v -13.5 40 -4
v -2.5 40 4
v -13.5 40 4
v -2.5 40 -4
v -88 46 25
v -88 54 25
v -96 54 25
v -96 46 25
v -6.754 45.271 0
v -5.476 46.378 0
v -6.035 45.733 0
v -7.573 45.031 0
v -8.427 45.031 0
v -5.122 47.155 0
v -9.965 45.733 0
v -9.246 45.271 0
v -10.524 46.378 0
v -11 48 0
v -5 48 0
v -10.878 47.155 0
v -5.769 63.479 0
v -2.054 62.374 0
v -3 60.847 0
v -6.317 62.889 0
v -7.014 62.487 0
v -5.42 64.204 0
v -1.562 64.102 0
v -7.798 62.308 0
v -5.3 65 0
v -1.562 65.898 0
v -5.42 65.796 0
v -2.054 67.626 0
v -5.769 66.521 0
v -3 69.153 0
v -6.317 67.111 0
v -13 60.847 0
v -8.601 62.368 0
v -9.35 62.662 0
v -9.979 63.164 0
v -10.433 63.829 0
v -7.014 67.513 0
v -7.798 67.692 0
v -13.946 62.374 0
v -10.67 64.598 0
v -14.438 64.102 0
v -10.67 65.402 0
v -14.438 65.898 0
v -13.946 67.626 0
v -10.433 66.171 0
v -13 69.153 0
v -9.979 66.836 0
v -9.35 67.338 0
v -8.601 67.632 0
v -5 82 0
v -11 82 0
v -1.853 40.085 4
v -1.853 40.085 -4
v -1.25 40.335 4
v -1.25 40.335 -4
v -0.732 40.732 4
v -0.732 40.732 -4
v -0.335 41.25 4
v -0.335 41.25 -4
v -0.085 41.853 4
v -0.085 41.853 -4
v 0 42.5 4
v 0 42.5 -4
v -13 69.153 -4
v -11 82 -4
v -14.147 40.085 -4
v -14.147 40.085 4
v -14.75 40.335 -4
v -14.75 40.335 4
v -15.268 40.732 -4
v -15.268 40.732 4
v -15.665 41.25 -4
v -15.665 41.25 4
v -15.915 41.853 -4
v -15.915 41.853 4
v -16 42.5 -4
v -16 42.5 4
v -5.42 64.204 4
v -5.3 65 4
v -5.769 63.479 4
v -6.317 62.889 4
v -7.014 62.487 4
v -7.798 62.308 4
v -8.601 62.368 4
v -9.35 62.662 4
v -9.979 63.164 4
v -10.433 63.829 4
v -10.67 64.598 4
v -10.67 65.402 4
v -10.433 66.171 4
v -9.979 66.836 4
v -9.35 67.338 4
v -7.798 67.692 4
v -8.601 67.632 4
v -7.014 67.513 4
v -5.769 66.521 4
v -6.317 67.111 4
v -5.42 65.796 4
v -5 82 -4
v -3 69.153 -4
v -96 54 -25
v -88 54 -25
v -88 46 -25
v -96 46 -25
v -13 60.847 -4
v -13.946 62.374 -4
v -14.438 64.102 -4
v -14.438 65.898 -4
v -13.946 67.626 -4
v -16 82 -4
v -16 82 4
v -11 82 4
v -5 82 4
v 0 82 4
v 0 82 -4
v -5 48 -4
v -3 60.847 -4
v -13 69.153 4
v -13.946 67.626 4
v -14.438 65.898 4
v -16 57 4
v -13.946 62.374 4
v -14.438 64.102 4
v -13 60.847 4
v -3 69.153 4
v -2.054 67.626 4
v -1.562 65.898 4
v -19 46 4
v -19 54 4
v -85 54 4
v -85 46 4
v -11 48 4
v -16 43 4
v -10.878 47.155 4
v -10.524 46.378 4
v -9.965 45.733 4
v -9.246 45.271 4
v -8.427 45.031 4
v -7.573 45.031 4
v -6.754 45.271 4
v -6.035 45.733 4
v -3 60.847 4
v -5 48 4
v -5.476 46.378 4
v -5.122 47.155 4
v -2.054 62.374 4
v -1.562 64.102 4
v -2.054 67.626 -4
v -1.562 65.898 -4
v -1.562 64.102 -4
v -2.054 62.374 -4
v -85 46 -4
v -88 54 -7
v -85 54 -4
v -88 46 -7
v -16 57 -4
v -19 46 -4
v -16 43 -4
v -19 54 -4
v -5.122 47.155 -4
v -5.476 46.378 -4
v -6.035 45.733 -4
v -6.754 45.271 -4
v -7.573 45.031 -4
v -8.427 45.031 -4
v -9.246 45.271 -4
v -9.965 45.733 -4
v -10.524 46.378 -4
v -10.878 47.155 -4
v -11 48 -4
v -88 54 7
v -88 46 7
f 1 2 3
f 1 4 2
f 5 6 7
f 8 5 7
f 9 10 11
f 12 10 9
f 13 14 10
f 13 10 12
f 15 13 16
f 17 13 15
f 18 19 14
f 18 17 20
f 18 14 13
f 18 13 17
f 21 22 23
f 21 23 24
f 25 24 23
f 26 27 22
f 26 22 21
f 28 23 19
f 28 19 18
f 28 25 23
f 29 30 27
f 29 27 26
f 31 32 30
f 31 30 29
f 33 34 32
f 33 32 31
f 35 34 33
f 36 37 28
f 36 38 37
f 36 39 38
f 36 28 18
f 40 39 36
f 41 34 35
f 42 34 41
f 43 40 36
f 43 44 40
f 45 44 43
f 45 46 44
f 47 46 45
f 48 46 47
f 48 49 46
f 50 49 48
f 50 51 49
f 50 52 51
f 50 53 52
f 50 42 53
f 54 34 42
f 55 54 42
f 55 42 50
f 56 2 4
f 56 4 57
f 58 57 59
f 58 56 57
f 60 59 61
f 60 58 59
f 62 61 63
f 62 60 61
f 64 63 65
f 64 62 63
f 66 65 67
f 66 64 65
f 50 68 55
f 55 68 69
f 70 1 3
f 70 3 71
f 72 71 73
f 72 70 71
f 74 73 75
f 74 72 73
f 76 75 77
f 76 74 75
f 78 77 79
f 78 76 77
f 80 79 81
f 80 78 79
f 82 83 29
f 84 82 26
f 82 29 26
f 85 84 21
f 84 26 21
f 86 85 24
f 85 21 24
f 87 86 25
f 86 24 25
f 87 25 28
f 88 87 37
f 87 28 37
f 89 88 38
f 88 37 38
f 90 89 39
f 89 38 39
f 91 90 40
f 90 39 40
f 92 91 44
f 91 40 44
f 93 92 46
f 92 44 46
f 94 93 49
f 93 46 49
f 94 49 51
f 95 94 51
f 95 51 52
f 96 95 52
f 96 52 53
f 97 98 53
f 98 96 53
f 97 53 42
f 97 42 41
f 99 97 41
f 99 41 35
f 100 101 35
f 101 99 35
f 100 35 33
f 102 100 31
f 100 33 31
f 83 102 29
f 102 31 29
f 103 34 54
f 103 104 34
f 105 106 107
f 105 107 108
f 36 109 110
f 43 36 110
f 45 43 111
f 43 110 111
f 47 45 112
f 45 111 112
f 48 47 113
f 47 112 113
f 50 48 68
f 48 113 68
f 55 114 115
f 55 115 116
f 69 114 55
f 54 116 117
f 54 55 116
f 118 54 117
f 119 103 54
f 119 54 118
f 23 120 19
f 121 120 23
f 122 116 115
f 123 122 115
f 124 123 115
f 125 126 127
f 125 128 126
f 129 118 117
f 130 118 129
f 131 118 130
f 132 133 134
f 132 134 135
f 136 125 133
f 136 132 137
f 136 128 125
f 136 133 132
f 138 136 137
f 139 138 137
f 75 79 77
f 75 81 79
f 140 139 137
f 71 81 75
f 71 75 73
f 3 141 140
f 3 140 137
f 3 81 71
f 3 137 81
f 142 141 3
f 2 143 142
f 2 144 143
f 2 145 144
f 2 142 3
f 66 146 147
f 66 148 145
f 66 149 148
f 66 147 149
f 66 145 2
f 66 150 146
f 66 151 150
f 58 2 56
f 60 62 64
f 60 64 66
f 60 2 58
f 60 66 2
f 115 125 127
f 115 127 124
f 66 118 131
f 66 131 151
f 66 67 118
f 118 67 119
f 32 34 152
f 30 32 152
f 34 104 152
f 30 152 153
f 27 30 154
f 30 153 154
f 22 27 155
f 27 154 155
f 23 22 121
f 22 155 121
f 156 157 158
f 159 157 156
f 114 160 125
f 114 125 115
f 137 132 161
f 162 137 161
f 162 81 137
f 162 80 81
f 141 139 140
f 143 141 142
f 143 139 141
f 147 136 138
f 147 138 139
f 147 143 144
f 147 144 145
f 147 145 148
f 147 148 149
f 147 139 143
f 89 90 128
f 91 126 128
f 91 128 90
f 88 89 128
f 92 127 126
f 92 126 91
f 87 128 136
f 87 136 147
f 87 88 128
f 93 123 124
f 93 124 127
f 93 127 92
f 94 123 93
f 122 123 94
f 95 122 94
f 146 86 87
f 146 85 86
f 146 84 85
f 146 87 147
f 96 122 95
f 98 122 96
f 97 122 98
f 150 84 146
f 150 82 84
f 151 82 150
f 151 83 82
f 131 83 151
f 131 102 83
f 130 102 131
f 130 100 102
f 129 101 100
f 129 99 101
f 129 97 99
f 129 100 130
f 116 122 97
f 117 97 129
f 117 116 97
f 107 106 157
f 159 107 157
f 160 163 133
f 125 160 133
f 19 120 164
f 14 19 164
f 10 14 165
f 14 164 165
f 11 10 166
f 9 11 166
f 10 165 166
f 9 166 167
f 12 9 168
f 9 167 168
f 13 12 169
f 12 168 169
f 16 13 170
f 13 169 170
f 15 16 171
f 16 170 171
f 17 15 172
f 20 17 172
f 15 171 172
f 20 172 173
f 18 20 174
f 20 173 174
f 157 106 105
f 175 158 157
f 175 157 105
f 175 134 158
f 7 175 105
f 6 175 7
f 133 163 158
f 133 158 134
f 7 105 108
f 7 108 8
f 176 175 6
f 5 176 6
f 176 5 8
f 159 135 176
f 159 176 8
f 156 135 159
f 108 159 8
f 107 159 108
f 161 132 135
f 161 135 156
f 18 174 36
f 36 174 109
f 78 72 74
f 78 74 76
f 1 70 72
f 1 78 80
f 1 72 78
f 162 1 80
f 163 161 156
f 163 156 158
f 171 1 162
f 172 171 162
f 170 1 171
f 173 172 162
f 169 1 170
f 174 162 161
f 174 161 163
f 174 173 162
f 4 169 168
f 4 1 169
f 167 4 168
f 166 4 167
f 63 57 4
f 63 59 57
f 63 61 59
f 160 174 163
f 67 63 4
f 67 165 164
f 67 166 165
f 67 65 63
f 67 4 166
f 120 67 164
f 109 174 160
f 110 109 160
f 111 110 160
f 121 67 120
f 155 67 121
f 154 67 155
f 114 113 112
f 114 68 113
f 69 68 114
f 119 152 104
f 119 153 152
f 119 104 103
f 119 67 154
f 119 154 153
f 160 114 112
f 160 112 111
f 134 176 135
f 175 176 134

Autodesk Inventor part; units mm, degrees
ref_plane "YZ Plane" through (0, 0, 0) normal (1, 0, 0) x (0, 1, 0)
ref_plane "XZ Plane" through (0, 0, 0) normal (0, 1, 0) x (-1, 0, 0)
ref_plane "XY Plane" through (0, 0, 0) normal (0, 0, 1) x (1, 0, 0)
sketch "Skizze2" plane through (0, 0, 0) normal (0, 0, 1) x (1, 0, 0)
  line L0 (-19.9249, 0) -> (3.9249, 0) projected
  line L1 (0, -18.1036) -> (0, 108.6213) projected
  circle A0 centre (-8, 65) radius 2.7
  line L2 (0, 0) -> (0, 87.5)
  arc A1 (0, 87.5) -> (-2.5, 90) centre (-2.5, 87.5) ccw
  line L3 (-13.5, 90) -> (-2.5, 90)
  arc A2 (-13.5, 90) -> (-16, 87.5) centre (-13.5, 87.5) ccw
  line L4 (0, 42.5) -> (0, 87.5)
  line L5 (-16, 40) -> (-16, 87.5)
  line L6 (0, 40) -> (-16, 40)
  point P0 (-8, 90)
  dimension "d4" = 2.5
  dimension "d5" = 2.5
  dimension "d6" = 5.4
  dimension "d8" = 25
  dimension "d17" = 2.5
  dimension "d18" = 2.5
  dimension "d19" = 2.5
  dimension "d144" = 25
extrude "Extrusion1" add sketch "Skizze2" along normal mid plane 8
sketch "Skizze7" plane through (0, 0, -4) normal (0, 0, -1) x (-1, 0, 0)
  arc A0 (16, 87.5) -> (13.5, 90) centre (13.5, 87.5) ccw projected
  line L0 (13.5, 90) -> (2.5, 90) projected
  arc A1 (2.5, 90) -> (0, 87.5) centre (2.5, 87.5) ccw projected
  line L1 (0, 87.5) -> (0, 40) projected
  circle A2 centre (8, 65) radius 2.7 projected
  circle A3 centre (8, 65) radius 6.5
  line L2 (8, 85) -> (8, 45)
  line L3 (13, 82.2483) -> (13, 48.2483)
  line L4 (3, 48.3648) -> (3, 82.3648)
  line L5 (16, 40) -> (16, 87.5) projected
  line L6 (0, 40) -> (16, 40) projected
  circle A4 centre (8, 82) radius 3
  circle A5 centre (8, 48) radius 3
  line L7 (-2, 82) -> (18, 82)
  line L8 (-2, 48) -> (18, 48)
  line L9 (5, 48) -> (3, 60.8467)
  line L10 (11, 48) -> (13, 60.8467)
  line L11 (3, 69.1533) -> (5, 82)
  line L12 (13, 69.1533) -> (11, 82)
  point P0 (0, 0)
  point P1 (8, 65)
  dimension "d133" = 13
  dimension "d136" = 20
  dimension "d137" = 20
  dimension "d194" = 6
  dimension "d195" = 6
  dimension "d196" = 3
  dimension "d197" = 3
  dimension "d198" = 10
  dimension "d199" = 20
  dimension "d200" = 20
extrude "Extrusion5" cut sketch "Skizze7" against normal blind 4 contours L8 L2 A5 | A5 L2 L8 | A5 L2 A3 L10 | L3 A3 L2 A2 | A3 L3 | A3 L2 A4 L12 | L7 L2 A4 | A4 L2 L7 | A5 L8 L2 | A5 L9 A3 L2 | L2 L8 A5 | L2 A2 A3 L4 | A3 L11 A4 L2 | L2 L7 A4 | A4 L7 L2 | L4 A3
fillet "Rundung2" radius 2.5 2 edges at (0, 40, 0) (-16, 40, 0)
sketch "Skizze12" plane through (-16, 40, 4) normal (-1, 0, 0) x (0, 0, 1)
  line L0 (0, 47.5) -> (0, 0) projected
  line L1 (-8, 0) -> (-8, 47.5) projected
  line L2 (0, 47.5) -> (0, 2.5) projected
  line L3 (-8, 47.5) -> (0, 47.5) projected
  line L4 (-8, 2.5) -> (-8, 47.5) projected
  line L5 (0, 6) -> (-8, 6)
  line L6 (-8, 6) -> (-8, 14)
  line L7 (-8, 14) -> (0, 14)
  line L8 (0, 14) -> (0, 6)
  line L9 (0, 2.5) -> (-8, 2.5) projected
  point P0 (-4, -40)
  point P1 (0, 8)
  point P2 (-4, 20.6699)
  point P3 (0, 14)
  dimension "d184" = 8
extrude "Extrusion10" add sketch "Skizze12" along normal blind 80 contours L0 L5 L1 L7
sketch "Skizze17" plane through (-16, 54, 4) normal (0, 1, 0) x (1, 0, 0)
  line L0 (-80, 0) -> (-80, 8) projected
  line L1 (-72, 29) -> (-80, 29)
  line L2 (-72, -21) -> (-80, -21)
  line L3 (-80, 29) -> (-80, -21)
  line L4 (-72, 29) -> (-72, -21)
  line L5 (0, 8) -> (0, 0) projected
  line L6 (0, 8) -> (-80, 8) projected
  line L7 (-80, 0) -> (-80, 8) projected
  line L8 (0, 0) -> (-80, 0) projected
  line L9 (-80, 4) -> (0, 4)
  point P0 (16, 4)
  point P1 (-80, 8)
  dimension "d187" = 50
  dimension "d188" = 8
extrude "Extrusion15" add sketch "Skizze17" against normal blind 8 contours L8 L4 L2 L3 | L0 L9 L4 L8 | L0 L6 L4 L9 | L3 L1 L4 L6
chamfer "Fasen10" distance 3 angle 45 4 edges at (-16, 46, 0) (-16, 54, 0) (-88, 50, -4) (-88, 50, 4)
sketch "Skizze18" plane through (0, 0, 4) normal (0, 0, 1) x (1, 0, 0)
  circle A0 centre (-8, 65) radius 2.7 projected
  arc A1 (-13, 69.1533) -> (-13, 60.8467) centre (-8, 65) ccw projected
  line L0 (-11, 82) -> (-13, 69.1533) projected
  arc A2 (-5, 82) -> (-11, 82) centre (-8, 82) ccw projected
  line L1 (-3, 69.1533) -> (-5, 82) projected
  arc A3 (-3, 60.8467) -> (-3, 69.1533) centre (-8, 65) ccw projected
  line L2 (-5, 48) -> (-3, 60.8467) projected
  arc A4 (-11, 48) -> (-5, 48) centre (-8, 48) ccw projected
  line L3 (-13, 60.8467) -> (-11, 48) projected
  circle A5 centre (-8, 65) radius 2.7 projected
  point P0 (0, 0)
extrude "Extrusion16" cut sketch "Skizze18" against normal blind 0.0001
sketch "Skizze19" plane through (-13.5, 90, 4) normal (0, 1, 0) x (1, 0, 0)
  line L0 (11, 0) -> (0, 0) projected
  line L1 (0, 8) -> (11, 8) projected
  line L2 (11, 8) -> (11, 0) projected
  line L3 (13.5, 0) -> (11, 0) projected
  line L4 (13.5, 8) -> (13.5, 0) projected
  line L5 (11, 8) -> (13.5, 8) projected
  line L6 (-2.5, 8) -> (-2.5, 0) projected
  line L7 (0, 0) -> (-2.5, 0) projected
  line L8 (0, 0) -> (0, 8) projected
  line L9 (-2.5, 8) -> (0, 8) projected
  point P0 (13.5, 4)
extrude "Extrusion17" cut sketch "Skizze19" against normal blind 8
properties part number "Gripper neu"
